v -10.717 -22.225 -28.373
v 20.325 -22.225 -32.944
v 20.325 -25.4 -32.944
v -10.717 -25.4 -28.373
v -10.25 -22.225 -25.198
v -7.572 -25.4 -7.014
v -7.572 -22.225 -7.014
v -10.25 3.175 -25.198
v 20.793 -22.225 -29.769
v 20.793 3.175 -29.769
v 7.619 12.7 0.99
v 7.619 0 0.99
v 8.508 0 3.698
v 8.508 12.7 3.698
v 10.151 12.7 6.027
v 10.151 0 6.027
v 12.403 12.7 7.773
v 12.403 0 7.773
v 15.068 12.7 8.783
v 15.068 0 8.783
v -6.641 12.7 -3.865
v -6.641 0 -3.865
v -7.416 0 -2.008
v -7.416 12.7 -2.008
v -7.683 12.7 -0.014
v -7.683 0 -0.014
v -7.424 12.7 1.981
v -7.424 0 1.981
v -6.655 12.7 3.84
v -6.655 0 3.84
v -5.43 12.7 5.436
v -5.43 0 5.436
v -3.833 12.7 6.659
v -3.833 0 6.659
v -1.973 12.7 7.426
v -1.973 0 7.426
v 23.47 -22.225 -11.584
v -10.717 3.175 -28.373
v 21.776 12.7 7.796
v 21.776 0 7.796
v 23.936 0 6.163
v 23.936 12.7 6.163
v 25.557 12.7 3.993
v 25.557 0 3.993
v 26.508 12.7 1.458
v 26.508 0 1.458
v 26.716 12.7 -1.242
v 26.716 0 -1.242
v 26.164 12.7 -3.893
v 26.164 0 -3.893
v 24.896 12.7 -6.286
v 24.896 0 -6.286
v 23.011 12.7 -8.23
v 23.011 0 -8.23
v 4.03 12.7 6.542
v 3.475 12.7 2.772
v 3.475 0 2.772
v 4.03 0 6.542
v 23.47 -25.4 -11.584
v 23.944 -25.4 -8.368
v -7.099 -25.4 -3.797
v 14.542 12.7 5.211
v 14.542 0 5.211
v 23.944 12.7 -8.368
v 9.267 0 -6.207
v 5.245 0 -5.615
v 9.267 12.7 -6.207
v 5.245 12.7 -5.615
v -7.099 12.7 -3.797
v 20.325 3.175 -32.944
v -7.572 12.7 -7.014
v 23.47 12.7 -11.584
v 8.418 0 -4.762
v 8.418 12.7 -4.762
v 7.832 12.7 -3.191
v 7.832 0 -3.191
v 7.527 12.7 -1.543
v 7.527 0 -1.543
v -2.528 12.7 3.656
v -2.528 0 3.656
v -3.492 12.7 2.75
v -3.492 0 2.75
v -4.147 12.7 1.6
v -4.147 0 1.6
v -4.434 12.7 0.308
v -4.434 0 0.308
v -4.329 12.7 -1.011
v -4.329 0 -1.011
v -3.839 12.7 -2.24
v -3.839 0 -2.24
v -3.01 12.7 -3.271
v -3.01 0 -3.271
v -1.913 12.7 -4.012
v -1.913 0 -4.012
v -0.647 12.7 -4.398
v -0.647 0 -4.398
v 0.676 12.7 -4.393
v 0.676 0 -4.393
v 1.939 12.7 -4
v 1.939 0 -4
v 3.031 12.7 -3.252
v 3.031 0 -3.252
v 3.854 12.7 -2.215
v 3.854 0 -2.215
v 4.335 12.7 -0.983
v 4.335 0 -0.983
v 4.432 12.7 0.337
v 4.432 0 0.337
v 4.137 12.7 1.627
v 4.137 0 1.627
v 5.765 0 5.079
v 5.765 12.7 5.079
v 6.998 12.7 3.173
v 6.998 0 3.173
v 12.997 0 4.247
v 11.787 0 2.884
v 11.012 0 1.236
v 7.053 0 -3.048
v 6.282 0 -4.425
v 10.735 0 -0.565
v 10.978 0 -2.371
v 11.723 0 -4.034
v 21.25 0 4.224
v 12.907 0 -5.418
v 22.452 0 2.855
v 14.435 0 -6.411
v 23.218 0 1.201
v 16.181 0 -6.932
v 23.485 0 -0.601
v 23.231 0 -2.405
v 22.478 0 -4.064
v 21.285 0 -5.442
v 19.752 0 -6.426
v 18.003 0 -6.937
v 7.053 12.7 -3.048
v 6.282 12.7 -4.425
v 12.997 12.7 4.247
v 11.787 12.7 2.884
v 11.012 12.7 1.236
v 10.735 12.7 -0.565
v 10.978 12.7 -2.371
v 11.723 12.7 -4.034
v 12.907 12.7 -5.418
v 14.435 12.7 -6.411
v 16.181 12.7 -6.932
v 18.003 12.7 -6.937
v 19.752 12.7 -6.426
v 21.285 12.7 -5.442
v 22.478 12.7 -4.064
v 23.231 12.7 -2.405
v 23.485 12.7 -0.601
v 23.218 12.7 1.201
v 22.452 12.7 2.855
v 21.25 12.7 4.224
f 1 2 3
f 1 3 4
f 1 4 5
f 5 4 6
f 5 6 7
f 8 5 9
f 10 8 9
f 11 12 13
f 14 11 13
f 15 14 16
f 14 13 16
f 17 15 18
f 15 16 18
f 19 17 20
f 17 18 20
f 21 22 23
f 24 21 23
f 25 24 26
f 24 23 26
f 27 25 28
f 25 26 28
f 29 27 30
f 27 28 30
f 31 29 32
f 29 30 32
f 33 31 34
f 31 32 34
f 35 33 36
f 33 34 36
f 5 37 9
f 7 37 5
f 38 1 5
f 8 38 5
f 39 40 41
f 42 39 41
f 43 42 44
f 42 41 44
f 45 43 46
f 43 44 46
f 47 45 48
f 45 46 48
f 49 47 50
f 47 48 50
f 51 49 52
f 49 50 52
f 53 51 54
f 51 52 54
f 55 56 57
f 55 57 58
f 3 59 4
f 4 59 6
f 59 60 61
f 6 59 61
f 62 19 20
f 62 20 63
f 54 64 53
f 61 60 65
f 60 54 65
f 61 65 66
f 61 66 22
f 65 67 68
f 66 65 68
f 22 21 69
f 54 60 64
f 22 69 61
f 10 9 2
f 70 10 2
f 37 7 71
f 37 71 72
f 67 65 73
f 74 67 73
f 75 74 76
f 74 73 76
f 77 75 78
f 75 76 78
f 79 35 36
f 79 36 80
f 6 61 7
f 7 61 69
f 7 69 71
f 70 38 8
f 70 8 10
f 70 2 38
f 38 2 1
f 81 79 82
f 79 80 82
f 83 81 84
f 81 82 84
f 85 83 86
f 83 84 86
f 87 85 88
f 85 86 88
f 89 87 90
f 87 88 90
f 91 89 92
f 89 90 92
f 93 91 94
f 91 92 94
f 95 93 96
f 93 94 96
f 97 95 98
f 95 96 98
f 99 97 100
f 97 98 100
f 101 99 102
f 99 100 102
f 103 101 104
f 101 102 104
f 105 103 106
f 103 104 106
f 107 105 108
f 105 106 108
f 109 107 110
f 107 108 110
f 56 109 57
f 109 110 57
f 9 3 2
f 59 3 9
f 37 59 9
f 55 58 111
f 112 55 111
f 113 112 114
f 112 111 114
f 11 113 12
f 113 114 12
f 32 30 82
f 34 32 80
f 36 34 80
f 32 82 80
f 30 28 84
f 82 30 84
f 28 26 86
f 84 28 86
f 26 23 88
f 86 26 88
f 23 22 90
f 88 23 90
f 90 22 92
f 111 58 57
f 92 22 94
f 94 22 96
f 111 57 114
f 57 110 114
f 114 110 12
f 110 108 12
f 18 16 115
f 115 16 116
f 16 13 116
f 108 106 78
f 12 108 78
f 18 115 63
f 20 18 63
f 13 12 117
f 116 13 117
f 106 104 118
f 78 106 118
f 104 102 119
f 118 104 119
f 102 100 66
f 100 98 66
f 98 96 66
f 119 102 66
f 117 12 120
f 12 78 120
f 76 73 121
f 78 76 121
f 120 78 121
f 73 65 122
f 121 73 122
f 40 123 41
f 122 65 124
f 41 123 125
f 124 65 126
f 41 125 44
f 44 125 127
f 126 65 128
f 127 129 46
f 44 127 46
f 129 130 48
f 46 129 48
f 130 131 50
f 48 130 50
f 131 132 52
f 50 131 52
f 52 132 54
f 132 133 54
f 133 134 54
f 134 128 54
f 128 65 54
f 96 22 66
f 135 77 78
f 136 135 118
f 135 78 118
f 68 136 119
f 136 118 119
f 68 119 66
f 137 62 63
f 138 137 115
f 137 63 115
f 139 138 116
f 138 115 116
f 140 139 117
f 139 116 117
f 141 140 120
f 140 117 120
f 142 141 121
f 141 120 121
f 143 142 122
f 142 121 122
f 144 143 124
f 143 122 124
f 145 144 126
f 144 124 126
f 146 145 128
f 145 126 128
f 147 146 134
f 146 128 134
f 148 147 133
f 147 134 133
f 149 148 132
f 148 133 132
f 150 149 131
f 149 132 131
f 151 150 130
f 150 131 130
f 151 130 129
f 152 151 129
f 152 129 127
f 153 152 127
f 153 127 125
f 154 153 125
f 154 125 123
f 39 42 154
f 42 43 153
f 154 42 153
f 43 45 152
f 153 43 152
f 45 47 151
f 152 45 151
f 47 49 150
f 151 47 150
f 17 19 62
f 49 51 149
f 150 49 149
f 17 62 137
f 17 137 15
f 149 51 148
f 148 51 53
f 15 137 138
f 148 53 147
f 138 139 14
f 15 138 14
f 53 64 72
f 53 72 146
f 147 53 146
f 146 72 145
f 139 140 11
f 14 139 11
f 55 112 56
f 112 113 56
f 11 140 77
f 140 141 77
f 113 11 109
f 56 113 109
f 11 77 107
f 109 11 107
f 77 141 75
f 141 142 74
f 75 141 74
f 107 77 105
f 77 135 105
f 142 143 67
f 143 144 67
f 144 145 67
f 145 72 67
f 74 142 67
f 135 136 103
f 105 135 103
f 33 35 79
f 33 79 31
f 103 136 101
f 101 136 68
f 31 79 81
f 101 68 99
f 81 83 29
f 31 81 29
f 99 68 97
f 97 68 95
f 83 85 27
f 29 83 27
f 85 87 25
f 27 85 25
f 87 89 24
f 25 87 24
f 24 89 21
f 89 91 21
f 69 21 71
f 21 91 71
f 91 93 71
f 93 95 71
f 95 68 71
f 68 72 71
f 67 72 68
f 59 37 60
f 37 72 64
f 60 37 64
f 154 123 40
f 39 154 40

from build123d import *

# Parameters (mm, degrees)
BOSS_EXTRUDE1_DEPTH = 12.7
SKETCH2_R           = 4.445
SKETCH2_R_2         = 6.3754
CUT_EXTRUDE1_DEPTH  = 32.324143561
BOSS_EXTRUDE2_DEPTH = 38.1
SKETCH6_W           = 31.377120578
SKETCH6_H           = 3.175
BOSS_EXTRUDE5_DEPTH = 21.59
BOSS_EXTRUDE6_DEPTH = 25.4
CUT_EXTRUDE3_DEPTH  = 58.023970058


with BuildPart() as part:
    # Sketch1 → Boss-Extrude1 (new body)
    with BuildSketch(Plane(origin=(0, 0, 0), x_dir=(1, 0, 0), z_dir=(0, 1, 0))):
        with BuildLine():
            ThreePointArc((7.527044942, 1.542649246), (-7.678390875, -0.2801532), (7.619451552, -0.990015299))
            ThreePointArc((7.619451552, -0.990015299), (26.729936345, 0.975266474), (7.527044942, 1.542649246))
        make_face()
    extrude(amount=BOSS_EXTRUDE1_DEPTH)

    # Sketch2 → Cut-Extrude1 (cut, through all)
    with BuildSketch(Plane.XZ):
        with Locations(Location((0, 0, 0), (0, 0, 270))):
            Circle(SKETCH2_R)
        with Locations(Location((17.109737529, -0.624264614, 0), (0, 0, 270))):
            Circle(SKETCH2_R_2)
    extrude(amount=-CUT_EXTRUDE1_DEPTH, mode=Mode.SUBTRACT)

    # Sketch3 → Boss-Extrude2 (add)
    with BuildSketch(Plane(origin=(0, 12.7, 0), x_dir=(1, 0, 0), z_dir=(0, 1, 0))):
        Polygon((-7.5722719, 7.013696287), (23.470212778, 11.584018023), (23.943763832, 8.367570213), (-7.098720846, 3.797248478), align=None)
    extrude(amount=-BOSS_EXTRUDE2_DEPTH)

    # Sketch6 → Boss-Extrude5 (add)
    with BuildSketch(Plane(origin=(-1.171358862, 0, -7.956089665), x_dir=(-0.989335034779027, 0, 0.14565778028921603), z_dir=(-0.14565778028921603, 0, -0.989335034779027))):
        with Locations((-9.218645838, -23.8125)):
            Rectangle(SKETCH6_W, SKETCH6_H)
    extrude(amount=BOSS_EXTRUDE5_DEPTH)

    # Sketch7 → Boss-Extrude6 (add)
    with BuildSketch(Plane(origin=(0, -22.225, 0), x_dir=(1, 0, 0), z_dir=(0, 1, 0))):
        Polygon((-10.717023377, 28.373439688), (-10.249574599, 25.198439688), (20.792910079, 29.768761424), (20.325461302, 32.943761424), align=None)
    extrude(amount=BOSS_EXTRUDE6_DEPTH)

    # Sketch8 → Cut-Extrude3 (cut, through all)
    with BuildSketch(Plane(origin=(0, 12.7, 0), x_dir=(1, 0, 0), z_dir=(0, 1, 0))):
        Polygon((-2.52817795, -3.656000718), (3.474592527, -2.772225058), (4.3267986, -8.560568969), (-1.675971877, -9.444344629), align=None)
        Polygon((14.542367287, -5.211344626), (21.250041443, -4.223787434), (21.957699633, -9.030334935), (15.250025476, -10.017892127), align=None)
    extrude(amount=-CUT_EXTRUDE3_DEPTH, mode=Mode.SUBTRACT)


solid = part.part
